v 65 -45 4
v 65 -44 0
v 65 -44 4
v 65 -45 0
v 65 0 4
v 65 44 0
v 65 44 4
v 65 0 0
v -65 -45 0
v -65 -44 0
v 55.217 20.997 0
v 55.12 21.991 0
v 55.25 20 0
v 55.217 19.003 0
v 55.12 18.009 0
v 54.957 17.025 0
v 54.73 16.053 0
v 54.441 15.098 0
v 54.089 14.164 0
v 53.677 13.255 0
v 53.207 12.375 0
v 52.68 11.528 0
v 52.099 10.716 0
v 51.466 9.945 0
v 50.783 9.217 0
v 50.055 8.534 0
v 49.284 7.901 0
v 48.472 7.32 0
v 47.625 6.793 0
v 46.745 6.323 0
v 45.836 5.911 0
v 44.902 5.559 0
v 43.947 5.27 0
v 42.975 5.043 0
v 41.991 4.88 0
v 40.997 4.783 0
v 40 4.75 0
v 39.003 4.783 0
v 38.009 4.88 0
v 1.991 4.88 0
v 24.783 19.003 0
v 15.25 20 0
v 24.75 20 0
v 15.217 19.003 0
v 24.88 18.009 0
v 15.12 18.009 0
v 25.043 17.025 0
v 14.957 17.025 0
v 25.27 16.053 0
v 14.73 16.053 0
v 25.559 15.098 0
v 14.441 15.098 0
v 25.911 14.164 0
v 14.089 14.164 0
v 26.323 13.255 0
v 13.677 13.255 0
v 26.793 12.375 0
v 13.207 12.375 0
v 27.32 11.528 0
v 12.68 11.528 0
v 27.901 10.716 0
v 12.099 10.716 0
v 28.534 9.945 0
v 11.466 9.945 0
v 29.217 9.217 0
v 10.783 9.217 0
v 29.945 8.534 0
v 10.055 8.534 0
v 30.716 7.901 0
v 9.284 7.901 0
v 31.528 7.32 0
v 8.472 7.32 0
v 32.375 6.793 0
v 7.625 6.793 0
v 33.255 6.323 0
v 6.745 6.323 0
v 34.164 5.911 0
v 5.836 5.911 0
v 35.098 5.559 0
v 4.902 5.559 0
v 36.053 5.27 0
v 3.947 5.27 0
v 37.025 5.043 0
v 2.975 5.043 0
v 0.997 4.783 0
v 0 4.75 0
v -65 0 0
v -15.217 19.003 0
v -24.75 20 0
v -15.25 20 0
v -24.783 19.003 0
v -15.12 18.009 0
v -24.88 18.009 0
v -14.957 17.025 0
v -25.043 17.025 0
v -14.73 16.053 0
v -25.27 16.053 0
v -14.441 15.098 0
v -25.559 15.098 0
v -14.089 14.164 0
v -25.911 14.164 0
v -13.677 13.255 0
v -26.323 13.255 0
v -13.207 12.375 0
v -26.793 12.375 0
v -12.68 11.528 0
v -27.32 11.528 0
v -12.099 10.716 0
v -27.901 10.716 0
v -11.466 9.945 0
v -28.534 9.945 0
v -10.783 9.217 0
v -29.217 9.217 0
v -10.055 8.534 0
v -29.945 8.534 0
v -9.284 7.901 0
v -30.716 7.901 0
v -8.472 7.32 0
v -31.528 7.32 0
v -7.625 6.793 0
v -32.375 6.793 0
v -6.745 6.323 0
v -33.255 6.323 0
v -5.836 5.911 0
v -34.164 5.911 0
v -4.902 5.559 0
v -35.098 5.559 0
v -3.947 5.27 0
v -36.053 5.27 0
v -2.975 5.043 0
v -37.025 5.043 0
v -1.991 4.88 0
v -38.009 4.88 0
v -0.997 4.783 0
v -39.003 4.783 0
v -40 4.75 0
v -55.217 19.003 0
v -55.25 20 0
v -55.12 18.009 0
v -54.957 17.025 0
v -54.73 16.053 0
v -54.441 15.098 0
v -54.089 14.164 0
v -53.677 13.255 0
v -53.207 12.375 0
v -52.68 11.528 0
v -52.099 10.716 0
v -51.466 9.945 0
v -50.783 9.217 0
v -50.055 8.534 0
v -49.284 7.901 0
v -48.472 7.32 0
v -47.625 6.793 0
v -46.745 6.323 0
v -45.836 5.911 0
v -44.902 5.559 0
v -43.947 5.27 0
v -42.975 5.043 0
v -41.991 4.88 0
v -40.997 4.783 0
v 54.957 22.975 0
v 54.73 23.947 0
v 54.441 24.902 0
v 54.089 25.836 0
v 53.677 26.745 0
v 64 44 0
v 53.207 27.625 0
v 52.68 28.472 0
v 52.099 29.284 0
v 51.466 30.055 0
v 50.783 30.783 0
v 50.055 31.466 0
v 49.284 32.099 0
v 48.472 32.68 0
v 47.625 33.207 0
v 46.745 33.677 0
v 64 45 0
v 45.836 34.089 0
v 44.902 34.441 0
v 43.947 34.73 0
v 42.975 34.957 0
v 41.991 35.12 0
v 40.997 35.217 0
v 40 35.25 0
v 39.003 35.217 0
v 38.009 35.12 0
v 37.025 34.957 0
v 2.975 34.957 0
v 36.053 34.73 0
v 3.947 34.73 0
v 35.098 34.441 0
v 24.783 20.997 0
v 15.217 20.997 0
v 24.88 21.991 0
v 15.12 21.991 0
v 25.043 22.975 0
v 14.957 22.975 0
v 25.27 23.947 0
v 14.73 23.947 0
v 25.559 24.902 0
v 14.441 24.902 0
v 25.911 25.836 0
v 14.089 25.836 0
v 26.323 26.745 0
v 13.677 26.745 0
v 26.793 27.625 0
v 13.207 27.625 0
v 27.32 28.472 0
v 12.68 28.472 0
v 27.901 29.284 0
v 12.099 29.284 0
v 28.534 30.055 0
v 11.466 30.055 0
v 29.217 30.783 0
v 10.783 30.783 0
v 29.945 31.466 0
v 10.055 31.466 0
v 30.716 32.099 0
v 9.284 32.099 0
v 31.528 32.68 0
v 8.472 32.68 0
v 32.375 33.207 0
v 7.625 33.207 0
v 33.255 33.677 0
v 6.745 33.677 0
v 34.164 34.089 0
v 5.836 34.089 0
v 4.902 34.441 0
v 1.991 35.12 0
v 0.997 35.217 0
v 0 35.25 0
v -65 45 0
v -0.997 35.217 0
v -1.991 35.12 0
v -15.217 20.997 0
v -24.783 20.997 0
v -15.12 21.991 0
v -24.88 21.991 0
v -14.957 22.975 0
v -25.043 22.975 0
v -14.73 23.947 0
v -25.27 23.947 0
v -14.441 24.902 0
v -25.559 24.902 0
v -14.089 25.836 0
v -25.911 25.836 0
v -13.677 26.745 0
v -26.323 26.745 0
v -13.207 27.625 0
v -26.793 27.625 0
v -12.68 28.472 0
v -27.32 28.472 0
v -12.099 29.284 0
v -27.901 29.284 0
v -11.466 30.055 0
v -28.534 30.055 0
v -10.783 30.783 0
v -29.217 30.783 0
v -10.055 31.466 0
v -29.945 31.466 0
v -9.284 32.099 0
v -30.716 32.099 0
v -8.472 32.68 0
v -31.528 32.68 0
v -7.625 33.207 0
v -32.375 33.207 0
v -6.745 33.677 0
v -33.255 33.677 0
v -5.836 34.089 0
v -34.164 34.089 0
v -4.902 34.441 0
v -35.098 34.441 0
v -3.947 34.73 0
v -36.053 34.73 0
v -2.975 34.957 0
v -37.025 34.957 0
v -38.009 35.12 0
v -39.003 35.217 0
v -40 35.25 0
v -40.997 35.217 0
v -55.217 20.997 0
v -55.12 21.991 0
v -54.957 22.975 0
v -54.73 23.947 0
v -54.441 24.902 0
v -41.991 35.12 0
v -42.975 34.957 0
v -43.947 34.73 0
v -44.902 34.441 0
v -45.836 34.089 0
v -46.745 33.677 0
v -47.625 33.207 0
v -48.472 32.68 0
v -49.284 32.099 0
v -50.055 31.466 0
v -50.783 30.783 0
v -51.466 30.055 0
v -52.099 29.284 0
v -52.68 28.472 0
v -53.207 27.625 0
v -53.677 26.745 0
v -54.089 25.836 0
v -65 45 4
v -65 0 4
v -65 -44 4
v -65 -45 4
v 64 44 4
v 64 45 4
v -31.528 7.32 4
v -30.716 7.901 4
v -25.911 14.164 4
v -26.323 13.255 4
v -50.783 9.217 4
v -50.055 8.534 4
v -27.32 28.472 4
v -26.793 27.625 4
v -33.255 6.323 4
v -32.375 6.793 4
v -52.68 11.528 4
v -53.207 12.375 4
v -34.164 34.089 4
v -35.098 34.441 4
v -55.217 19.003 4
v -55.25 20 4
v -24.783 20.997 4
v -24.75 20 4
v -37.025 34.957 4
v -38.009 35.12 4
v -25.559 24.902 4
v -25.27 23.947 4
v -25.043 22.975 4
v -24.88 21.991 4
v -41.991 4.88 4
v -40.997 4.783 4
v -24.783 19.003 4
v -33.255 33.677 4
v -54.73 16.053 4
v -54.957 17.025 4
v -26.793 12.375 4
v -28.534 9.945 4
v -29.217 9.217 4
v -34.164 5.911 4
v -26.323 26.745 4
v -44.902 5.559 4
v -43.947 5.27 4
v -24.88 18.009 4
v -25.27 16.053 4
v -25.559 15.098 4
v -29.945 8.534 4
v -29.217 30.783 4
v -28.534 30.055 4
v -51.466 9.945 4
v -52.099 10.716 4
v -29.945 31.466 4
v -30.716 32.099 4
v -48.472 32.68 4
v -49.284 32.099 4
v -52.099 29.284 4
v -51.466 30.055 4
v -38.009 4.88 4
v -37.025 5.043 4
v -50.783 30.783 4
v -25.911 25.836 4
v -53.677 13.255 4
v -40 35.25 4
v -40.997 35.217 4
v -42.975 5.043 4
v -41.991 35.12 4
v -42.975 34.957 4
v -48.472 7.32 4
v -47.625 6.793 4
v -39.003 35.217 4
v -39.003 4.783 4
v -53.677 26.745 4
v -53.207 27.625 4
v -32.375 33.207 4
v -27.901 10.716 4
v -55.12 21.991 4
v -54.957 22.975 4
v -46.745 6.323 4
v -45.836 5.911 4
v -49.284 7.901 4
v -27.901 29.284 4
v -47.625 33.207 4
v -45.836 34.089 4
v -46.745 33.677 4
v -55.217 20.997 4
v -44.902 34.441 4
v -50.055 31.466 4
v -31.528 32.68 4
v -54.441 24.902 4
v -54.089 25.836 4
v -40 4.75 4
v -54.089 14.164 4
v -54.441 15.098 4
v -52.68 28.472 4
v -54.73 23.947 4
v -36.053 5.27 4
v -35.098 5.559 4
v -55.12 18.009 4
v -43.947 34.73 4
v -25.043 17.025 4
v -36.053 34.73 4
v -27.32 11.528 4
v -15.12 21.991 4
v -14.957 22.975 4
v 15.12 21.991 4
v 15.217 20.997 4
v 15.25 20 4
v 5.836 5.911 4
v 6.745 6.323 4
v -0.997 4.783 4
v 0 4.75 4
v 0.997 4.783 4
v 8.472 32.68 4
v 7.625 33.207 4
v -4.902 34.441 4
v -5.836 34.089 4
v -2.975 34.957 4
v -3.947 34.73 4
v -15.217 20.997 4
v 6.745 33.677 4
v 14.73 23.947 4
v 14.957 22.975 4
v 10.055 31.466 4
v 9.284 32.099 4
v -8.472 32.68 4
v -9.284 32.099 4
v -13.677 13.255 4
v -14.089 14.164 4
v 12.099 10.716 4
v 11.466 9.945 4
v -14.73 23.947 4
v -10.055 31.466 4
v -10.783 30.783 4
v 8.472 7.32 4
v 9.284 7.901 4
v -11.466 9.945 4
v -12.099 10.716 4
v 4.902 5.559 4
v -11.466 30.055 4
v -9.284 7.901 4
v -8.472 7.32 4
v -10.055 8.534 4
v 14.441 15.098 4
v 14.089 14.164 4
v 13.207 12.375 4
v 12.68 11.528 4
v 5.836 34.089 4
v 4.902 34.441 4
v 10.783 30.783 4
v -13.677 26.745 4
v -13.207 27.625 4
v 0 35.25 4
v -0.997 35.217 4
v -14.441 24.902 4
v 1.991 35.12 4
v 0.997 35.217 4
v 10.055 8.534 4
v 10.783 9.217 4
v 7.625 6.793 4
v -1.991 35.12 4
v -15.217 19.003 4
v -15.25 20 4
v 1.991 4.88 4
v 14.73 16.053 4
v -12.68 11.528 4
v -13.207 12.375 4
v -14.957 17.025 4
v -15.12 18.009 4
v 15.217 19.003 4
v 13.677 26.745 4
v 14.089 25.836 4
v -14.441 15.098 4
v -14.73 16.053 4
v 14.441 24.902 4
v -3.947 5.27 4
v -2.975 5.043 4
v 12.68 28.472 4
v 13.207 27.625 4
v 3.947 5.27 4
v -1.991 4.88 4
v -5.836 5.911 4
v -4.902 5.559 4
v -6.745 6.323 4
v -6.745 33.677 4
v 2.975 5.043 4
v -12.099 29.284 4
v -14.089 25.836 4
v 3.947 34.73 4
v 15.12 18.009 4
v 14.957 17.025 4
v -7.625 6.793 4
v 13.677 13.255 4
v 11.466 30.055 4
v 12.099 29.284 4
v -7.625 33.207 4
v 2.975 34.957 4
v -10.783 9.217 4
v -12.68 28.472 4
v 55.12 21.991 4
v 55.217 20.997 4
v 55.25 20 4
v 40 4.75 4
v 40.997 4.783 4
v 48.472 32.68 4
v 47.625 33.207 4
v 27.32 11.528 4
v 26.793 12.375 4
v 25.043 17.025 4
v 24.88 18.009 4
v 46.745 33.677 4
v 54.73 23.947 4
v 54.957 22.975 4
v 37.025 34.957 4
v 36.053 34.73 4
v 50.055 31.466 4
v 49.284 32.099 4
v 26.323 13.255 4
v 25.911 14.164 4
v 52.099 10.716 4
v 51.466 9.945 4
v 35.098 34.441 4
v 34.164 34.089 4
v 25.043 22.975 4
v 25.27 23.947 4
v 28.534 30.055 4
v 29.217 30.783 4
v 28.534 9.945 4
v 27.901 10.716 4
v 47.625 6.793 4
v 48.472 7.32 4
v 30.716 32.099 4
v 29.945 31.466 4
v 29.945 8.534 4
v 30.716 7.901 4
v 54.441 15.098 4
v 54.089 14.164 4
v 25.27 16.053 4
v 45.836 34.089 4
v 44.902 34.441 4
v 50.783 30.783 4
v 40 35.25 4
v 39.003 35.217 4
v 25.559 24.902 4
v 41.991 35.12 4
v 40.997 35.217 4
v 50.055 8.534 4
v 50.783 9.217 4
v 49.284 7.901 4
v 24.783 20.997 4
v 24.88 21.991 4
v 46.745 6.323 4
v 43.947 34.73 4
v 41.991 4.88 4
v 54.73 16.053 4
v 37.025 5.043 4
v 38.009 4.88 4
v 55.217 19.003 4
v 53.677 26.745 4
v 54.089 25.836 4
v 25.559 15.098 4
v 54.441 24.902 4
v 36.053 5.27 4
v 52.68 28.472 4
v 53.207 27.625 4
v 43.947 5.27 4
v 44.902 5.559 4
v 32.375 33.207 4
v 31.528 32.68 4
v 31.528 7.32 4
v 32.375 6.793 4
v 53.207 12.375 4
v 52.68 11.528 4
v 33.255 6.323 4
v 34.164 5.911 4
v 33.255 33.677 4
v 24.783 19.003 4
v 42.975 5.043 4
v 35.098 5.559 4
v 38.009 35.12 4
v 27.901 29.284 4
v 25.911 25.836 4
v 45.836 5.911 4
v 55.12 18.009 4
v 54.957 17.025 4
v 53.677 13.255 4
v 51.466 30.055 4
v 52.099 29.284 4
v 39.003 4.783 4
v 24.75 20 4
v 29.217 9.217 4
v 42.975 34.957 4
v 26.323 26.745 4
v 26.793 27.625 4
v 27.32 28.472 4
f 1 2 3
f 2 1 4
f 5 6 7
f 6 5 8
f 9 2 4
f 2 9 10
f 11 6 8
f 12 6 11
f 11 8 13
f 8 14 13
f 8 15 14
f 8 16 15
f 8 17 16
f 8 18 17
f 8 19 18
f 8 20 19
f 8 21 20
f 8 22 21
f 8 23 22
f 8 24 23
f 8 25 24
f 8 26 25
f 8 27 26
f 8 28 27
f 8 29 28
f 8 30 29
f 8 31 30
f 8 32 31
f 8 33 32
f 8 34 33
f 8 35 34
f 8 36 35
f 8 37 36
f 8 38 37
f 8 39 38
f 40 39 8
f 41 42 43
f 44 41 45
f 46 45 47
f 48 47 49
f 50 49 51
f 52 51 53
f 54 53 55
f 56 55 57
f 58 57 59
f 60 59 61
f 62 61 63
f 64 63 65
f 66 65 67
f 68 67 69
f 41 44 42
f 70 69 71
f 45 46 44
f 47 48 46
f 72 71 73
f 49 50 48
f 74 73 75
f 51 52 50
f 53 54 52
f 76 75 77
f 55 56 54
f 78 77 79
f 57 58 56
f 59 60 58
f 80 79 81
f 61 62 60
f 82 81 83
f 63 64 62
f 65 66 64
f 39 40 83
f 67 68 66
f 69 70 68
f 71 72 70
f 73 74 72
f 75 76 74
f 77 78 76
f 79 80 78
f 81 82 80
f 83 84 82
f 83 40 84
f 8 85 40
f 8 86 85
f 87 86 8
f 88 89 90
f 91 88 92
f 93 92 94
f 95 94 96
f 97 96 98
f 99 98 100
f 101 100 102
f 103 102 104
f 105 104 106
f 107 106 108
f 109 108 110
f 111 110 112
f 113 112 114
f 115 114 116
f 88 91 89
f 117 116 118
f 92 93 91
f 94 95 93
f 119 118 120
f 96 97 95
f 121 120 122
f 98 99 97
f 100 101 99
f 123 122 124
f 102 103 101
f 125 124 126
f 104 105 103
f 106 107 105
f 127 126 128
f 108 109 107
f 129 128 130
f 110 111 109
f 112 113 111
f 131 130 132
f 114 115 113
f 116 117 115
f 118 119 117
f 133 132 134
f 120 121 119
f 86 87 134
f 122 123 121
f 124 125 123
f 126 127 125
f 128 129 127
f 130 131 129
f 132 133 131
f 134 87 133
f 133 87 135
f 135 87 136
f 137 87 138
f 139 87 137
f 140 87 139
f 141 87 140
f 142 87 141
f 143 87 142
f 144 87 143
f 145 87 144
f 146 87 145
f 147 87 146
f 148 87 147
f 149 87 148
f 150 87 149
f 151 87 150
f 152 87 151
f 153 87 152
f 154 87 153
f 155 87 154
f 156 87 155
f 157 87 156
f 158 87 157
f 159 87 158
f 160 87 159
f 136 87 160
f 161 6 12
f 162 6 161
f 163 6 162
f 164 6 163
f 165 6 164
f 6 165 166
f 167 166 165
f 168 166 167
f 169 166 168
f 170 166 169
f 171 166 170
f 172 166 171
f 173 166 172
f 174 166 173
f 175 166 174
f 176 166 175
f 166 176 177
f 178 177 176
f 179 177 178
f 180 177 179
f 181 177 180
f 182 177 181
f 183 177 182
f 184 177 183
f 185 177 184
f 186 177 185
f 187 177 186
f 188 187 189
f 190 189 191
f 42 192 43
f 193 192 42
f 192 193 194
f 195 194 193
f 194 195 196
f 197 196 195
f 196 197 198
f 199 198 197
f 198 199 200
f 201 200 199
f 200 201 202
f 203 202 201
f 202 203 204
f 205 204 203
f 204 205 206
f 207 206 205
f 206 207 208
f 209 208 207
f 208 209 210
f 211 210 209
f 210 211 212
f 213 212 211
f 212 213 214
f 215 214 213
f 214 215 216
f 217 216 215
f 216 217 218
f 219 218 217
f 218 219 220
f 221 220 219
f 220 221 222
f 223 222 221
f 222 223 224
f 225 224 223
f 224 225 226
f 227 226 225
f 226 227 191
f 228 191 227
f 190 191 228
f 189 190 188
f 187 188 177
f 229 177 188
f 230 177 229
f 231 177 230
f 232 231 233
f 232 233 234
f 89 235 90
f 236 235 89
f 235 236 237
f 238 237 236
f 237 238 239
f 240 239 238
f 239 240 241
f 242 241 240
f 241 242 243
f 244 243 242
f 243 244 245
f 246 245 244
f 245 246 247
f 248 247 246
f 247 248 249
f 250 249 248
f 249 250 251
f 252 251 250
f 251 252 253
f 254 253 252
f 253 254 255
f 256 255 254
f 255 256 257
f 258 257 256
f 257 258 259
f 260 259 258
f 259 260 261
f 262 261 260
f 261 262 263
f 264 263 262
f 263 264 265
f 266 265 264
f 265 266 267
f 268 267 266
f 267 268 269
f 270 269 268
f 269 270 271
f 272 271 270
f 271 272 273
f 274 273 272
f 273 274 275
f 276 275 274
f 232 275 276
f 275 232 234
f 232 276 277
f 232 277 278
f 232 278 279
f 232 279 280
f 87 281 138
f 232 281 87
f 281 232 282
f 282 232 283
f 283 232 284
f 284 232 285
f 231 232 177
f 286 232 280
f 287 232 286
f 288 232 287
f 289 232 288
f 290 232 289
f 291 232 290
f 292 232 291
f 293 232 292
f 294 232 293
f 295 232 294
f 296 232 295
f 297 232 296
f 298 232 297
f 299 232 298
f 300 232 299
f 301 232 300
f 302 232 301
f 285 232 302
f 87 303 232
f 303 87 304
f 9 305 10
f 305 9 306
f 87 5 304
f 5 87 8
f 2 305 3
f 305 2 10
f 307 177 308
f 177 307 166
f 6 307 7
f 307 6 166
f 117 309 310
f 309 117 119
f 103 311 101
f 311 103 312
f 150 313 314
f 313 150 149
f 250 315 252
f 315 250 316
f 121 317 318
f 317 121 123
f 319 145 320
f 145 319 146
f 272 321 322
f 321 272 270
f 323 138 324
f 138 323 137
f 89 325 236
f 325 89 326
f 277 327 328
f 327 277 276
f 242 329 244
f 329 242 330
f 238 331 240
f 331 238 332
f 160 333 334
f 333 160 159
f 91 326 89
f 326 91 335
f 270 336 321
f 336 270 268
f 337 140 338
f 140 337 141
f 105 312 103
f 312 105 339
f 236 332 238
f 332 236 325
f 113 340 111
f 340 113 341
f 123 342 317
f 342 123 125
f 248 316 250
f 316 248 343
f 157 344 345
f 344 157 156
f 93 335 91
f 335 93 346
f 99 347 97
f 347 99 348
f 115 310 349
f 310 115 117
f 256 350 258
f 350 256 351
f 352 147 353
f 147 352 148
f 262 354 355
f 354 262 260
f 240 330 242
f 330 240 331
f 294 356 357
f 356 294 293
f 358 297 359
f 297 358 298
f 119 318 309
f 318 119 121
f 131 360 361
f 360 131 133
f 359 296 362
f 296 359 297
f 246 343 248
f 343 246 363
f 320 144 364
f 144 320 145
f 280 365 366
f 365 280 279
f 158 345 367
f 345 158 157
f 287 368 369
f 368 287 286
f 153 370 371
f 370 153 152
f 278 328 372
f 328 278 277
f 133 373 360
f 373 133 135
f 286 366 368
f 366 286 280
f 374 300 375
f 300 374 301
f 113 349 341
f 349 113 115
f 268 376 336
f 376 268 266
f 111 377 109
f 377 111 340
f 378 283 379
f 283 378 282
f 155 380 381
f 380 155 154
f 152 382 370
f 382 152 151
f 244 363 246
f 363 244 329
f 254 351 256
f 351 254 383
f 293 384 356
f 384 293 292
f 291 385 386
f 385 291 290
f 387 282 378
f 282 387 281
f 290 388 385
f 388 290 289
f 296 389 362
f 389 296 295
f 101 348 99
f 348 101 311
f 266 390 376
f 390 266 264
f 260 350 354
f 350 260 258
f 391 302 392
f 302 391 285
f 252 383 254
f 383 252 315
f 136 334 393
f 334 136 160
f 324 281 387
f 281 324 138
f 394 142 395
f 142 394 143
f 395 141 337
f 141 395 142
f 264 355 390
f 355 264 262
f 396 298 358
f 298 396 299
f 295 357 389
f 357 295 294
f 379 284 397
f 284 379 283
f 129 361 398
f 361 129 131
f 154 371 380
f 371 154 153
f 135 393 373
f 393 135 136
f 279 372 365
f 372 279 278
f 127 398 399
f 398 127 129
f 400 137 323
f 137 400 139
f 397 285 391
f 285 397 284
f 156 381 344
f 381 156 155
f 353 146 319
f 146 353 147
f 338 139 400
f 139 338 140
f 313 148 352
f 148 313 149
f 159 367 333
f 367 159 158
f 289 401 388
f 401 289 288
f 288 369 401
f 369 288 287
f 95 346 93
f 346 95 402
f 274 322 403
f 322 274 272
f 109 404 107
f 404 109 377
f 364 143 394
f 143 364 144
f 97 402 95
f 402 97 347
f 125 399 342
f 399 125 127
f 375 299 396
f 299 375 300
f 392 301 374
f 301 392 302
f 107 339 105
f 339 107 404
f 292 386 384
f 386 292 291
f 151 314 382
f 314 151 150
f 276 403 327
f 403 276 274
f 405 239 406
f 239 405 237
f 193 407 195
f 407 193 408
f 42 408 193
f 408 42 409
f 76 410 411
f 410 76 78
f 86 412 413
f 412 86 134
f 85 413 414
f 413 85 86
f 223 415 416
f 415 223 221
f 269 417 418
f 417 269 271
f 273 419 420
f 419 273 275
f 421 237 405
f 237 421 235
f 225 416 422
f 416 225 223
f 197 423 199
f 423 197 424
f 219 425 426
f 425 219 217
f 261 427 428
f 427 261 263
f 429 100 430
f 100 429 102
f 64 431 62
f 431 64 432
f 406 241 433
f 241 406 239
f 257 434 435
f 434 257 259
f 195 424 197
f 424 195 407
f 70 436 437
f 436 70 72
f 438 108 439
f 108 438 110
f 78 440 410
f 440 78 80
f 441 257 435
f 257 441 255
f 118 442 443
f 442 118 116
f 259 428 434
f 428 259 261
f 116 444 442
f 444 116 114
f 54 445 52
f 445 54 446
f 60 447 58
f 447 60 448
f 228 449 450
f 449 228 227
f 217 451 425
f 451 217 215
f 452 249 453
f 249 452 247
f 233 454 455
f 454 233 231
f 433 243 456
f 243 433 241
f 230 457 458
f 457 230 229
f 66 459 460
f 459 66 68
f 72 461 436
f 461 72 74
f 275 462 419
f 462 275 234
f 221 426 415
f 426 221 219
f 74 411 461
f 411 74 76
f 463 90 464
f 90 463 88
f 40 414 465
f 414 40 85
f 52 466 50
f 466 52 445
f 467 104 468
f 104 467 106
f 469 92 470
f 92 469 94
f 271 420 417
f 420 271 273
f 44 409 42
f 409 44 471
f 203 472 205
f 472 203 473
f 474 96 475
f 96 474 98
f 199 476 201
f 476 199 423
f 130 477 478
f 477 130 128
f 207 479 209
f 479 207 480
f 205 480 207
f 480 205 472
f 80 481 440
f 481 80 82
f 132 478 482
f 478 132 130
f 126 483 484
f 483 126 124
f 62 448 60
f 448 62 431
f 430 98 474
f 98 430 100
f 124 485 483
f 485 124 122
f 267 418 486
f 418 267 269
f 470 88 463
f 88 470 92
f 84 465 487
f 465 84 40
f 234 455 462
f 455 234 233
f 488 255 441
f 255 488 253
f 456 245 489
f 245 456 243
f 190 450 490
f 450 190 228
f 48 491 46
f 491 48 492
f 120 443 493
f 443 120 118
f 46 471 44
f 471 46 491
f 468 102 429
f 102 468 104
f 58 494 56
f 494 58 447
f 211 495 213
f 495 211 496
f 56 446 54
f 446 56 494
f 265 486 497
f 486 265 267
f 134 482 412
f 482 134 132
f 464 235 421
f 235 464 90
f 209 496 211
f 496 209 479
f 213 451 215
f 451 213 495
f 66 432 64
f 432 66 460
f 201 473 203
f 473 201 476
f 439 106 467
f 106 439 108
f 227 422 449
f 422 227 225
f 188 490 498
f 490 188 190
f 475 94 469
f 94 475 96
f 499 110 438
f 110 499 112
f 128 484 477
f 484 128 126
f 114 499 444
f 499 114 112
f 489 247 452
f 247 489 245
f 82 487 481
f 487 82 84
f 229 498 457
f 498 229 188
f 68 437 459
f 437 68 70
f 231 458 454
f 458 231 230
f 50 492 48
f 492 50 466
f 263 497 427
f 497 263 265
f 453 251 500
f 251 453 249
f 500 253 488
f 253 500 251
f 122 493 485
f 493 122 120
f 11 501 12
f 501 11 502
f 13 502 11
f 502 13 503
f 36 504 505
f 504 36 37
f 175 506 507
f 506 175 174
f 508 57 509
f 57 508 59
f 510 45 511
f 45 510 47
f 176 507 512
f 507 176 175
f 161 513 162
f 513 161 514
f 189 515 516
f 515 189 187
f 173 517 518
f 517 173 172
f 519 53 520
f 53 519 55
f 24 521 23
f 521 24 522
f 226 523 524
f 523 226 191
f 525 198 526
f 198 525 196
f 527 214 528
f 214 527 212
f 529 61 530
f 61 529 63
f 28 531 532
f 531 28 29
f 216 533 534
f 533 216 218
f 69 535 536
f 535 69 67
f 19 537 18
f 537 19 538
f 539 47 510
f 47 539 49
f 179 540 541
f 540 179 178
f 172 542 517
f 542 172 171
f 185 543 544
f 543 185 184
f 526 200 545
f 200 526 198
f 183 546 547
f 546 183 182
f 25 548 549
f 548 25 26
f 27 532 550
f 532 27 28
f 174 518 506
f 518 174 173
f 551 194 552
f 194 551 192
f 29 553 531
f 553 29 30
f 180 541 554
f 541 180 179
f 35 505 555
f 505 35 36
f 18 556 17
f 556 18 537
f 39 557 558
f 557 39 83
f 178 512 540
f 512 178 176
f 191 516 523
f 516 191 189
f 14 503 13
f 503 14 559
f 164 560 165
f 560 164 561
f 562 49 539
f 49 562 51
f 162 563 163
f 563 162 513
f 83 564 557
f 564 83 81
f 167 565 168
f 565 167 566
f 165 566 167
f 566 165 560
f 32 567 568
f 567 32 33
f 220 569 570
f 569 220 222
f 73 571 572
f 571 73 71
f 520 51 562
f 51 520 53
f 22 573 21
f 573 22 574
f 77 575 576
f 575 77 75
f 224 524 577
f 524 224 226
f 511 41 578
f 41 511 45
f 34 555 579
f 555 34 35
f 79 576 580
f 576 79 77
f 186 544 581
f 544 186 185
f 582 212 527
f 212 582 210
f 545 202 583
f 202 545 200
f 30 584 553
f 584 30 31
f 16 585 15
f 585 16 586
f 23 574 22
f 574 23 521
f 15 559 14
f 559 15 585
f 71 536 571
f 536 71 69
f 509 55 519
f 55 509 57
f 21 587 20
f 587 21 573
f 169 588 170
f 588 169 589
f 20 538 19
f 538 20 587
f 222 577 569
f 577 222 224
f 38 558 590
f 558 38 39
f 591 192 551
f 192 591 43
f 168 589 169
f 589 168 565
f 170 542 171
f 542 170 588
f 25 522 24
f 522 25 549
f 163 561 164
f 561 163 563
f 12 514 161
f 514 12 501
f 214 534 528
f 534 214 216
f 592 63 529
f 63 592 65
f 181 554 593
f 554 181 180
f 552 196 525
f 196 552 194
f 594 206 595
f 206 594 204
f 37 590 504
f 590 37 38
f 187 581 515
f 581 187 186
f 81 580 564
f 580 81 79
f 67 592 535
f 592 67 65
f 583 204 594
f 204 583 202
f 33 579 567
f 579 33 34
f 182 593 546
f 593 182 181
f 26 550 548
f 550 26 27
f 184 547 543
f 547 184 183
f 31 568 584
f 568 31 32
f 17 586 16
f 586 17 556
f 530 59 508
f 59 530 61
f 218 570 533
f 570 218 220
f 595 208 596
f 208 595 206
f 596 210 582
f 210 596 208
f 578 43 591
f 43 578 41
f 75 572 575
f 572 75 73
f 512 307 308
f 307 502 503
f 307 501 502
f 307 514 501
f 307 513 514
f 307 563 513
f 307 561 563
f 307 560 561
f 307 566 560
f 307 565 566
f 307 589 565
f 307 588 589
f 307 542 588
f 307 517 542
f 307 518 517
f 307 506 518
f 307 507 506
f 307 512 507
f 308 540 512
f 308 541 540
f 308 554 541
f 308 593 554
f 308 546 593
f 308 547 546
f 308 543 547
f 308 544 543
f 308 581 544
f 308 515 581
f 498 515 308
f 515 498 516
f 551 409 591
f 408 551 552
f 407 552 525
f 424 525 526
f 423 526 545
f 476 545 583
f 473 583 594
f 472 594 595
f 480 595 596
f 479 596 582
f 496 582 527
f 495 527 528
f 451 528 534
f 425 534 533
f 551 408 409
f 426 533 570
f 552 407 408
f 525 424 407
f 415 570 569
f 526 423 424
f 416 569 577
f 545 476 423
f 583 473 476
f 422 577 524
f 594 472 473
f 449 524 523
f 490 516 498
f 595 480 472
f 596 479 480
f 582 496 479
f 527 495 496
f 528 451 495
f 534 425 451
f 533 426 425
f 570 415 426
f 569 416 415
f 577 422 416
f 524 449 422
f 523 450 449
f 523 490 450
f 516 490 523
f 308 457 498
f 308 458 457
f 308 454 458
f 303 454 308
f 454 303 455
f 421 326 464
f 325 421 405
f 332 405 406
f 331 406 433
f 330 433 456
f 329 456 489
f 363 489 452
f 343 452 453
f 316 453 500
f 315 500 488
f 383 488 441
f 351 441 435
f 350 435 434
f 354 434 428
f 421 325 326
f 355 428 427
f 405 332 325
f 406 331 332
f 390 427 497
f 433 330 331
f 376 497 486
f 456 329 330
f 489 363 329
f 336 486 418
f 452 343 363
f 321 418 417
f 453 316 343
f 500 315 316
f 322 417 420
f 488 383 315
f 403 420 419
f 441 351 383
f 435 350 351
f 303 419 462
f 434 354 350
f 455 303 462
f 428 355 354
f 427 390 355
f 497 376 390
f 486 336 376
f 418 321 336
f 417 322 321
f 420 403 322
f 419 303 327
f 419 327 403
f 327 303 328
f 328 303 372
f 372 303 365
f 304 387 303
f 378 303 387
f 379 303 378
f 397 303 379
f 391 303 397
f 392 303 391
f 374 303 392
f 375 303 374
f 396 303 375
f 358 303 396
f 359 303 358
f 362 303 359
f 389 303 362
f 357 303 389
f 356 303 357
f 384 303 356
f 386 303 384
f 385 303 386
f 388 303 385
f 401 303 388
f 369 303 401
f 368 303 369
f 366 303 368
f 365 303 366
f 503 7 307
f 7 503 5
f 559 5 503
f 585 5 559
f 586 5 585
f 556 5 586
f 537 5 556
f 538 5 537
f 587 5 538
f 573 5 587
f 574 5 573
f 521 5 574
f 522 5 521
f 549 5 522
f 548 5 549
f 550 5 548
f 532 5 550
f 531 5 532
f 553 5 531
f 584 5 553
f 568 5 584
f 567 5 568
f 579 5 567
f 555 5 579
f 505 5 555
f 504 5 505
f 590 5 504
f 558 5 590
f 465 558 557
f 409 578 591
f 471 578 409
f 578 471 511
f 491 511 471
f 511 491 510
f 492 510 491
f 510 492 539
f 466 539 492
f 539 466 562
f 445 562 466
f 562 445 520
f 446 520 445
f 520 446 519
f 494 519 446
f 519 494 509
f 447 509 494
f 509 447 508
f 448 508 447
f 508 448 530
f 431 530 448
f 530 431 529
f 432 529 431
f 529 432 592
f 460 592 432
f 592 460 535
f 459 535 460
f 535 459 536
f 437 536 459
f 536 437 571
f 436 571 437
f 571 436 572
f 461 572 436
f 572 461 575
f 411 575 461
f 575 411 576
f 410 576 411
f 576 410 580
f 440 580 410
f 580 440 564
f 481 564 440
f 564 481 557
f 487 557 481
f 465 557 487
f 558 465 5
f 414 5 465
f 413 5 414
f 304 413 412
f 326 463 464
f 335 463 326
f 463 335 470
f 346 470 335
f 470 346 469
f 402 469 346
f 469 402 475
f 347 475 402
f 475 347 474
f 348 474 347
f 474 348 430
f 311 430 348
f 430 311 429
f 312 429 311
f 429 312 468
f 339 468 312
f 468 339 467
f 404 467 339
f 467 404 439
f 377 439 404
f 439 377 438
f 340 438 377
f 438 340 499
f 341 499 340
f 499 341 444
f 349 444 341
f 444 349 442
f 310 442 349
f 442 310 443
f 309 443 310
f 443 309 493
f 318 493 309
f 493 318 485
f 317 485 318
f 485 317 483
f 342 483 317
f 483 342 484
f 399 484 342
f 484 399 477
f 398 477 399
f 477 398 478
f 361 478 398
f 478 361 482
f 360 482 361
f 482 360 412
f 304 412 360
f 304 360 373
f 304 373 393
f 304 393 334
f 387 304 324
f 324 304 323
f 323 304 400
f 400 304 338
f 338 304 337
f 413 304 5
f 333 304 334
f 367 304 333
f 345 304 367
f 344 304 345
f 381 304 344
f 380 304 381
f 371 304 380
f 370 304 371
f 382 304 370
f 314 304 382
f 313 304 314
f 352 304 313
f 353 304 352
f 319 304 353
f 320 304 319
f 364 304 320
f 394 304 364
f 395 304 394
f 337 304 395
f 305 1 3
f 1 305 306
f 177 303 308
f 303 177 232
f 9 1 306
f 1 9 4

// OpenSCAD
// Six-way conical tube rack (Falcon-style tubes)
// Print orientation: flat plate on the bed, two end walls rising to z = 70.
// After printing, flip the part over. The rack then stands on the walls
// and the tubes pass through the holes.

// ---------------- Parameters ----------------
plate_x      = 130;   // plate length along X (mm)
plate_y      = 90;    // plate width along Y (mm)
plate_t      = 4;     // plate thickness (mm), z = 0..4

hole_d       = 30.5;  // tube hole diameter (mm)
hole_nx      = 3;     // holes per row along X
hole_ny      = 2;     // rows along Y
hole_pitch   = 40;    // centre-to-centre spacing, X and Y (mm)

wall_h       = 70;    // end wall height above the plate (mm)

eps          = 0.5;   // cutter overshoot past faces (mm)
$fn          = 96;    // curve resolution

// ---------------- Model ----------------
difference() {
    // Base plate
    translate([-plate_x/2, -plate_y/2, 0])
        cube([plate_x, plate_y, plate_t]);

    // Two solid walls along the long edges, flush with the plate
    for (s = [-1, 1])
        translate([s > 0 ? plate_x/2 - 1 : -plate_x/2,
                   s * (plate_y/2 - 1), 0])
            cube([plate_x, plate_y/2 - 1, wall_h]);

    // Tube through-holes in a 2 x 3 grid, centred on the plate
    for (i = [0 : hole_nx - 1])
        for (j = [0 : hole_ny - 1])
            translate([(i - (hole_nx - 1)/2) * hole_pitch,
                       (j - (hole_ny - 1)/2) * hole_pitch,
                       -eps])
                cylinder(d = hole_d, h = plate_t + 2*eps);
}
